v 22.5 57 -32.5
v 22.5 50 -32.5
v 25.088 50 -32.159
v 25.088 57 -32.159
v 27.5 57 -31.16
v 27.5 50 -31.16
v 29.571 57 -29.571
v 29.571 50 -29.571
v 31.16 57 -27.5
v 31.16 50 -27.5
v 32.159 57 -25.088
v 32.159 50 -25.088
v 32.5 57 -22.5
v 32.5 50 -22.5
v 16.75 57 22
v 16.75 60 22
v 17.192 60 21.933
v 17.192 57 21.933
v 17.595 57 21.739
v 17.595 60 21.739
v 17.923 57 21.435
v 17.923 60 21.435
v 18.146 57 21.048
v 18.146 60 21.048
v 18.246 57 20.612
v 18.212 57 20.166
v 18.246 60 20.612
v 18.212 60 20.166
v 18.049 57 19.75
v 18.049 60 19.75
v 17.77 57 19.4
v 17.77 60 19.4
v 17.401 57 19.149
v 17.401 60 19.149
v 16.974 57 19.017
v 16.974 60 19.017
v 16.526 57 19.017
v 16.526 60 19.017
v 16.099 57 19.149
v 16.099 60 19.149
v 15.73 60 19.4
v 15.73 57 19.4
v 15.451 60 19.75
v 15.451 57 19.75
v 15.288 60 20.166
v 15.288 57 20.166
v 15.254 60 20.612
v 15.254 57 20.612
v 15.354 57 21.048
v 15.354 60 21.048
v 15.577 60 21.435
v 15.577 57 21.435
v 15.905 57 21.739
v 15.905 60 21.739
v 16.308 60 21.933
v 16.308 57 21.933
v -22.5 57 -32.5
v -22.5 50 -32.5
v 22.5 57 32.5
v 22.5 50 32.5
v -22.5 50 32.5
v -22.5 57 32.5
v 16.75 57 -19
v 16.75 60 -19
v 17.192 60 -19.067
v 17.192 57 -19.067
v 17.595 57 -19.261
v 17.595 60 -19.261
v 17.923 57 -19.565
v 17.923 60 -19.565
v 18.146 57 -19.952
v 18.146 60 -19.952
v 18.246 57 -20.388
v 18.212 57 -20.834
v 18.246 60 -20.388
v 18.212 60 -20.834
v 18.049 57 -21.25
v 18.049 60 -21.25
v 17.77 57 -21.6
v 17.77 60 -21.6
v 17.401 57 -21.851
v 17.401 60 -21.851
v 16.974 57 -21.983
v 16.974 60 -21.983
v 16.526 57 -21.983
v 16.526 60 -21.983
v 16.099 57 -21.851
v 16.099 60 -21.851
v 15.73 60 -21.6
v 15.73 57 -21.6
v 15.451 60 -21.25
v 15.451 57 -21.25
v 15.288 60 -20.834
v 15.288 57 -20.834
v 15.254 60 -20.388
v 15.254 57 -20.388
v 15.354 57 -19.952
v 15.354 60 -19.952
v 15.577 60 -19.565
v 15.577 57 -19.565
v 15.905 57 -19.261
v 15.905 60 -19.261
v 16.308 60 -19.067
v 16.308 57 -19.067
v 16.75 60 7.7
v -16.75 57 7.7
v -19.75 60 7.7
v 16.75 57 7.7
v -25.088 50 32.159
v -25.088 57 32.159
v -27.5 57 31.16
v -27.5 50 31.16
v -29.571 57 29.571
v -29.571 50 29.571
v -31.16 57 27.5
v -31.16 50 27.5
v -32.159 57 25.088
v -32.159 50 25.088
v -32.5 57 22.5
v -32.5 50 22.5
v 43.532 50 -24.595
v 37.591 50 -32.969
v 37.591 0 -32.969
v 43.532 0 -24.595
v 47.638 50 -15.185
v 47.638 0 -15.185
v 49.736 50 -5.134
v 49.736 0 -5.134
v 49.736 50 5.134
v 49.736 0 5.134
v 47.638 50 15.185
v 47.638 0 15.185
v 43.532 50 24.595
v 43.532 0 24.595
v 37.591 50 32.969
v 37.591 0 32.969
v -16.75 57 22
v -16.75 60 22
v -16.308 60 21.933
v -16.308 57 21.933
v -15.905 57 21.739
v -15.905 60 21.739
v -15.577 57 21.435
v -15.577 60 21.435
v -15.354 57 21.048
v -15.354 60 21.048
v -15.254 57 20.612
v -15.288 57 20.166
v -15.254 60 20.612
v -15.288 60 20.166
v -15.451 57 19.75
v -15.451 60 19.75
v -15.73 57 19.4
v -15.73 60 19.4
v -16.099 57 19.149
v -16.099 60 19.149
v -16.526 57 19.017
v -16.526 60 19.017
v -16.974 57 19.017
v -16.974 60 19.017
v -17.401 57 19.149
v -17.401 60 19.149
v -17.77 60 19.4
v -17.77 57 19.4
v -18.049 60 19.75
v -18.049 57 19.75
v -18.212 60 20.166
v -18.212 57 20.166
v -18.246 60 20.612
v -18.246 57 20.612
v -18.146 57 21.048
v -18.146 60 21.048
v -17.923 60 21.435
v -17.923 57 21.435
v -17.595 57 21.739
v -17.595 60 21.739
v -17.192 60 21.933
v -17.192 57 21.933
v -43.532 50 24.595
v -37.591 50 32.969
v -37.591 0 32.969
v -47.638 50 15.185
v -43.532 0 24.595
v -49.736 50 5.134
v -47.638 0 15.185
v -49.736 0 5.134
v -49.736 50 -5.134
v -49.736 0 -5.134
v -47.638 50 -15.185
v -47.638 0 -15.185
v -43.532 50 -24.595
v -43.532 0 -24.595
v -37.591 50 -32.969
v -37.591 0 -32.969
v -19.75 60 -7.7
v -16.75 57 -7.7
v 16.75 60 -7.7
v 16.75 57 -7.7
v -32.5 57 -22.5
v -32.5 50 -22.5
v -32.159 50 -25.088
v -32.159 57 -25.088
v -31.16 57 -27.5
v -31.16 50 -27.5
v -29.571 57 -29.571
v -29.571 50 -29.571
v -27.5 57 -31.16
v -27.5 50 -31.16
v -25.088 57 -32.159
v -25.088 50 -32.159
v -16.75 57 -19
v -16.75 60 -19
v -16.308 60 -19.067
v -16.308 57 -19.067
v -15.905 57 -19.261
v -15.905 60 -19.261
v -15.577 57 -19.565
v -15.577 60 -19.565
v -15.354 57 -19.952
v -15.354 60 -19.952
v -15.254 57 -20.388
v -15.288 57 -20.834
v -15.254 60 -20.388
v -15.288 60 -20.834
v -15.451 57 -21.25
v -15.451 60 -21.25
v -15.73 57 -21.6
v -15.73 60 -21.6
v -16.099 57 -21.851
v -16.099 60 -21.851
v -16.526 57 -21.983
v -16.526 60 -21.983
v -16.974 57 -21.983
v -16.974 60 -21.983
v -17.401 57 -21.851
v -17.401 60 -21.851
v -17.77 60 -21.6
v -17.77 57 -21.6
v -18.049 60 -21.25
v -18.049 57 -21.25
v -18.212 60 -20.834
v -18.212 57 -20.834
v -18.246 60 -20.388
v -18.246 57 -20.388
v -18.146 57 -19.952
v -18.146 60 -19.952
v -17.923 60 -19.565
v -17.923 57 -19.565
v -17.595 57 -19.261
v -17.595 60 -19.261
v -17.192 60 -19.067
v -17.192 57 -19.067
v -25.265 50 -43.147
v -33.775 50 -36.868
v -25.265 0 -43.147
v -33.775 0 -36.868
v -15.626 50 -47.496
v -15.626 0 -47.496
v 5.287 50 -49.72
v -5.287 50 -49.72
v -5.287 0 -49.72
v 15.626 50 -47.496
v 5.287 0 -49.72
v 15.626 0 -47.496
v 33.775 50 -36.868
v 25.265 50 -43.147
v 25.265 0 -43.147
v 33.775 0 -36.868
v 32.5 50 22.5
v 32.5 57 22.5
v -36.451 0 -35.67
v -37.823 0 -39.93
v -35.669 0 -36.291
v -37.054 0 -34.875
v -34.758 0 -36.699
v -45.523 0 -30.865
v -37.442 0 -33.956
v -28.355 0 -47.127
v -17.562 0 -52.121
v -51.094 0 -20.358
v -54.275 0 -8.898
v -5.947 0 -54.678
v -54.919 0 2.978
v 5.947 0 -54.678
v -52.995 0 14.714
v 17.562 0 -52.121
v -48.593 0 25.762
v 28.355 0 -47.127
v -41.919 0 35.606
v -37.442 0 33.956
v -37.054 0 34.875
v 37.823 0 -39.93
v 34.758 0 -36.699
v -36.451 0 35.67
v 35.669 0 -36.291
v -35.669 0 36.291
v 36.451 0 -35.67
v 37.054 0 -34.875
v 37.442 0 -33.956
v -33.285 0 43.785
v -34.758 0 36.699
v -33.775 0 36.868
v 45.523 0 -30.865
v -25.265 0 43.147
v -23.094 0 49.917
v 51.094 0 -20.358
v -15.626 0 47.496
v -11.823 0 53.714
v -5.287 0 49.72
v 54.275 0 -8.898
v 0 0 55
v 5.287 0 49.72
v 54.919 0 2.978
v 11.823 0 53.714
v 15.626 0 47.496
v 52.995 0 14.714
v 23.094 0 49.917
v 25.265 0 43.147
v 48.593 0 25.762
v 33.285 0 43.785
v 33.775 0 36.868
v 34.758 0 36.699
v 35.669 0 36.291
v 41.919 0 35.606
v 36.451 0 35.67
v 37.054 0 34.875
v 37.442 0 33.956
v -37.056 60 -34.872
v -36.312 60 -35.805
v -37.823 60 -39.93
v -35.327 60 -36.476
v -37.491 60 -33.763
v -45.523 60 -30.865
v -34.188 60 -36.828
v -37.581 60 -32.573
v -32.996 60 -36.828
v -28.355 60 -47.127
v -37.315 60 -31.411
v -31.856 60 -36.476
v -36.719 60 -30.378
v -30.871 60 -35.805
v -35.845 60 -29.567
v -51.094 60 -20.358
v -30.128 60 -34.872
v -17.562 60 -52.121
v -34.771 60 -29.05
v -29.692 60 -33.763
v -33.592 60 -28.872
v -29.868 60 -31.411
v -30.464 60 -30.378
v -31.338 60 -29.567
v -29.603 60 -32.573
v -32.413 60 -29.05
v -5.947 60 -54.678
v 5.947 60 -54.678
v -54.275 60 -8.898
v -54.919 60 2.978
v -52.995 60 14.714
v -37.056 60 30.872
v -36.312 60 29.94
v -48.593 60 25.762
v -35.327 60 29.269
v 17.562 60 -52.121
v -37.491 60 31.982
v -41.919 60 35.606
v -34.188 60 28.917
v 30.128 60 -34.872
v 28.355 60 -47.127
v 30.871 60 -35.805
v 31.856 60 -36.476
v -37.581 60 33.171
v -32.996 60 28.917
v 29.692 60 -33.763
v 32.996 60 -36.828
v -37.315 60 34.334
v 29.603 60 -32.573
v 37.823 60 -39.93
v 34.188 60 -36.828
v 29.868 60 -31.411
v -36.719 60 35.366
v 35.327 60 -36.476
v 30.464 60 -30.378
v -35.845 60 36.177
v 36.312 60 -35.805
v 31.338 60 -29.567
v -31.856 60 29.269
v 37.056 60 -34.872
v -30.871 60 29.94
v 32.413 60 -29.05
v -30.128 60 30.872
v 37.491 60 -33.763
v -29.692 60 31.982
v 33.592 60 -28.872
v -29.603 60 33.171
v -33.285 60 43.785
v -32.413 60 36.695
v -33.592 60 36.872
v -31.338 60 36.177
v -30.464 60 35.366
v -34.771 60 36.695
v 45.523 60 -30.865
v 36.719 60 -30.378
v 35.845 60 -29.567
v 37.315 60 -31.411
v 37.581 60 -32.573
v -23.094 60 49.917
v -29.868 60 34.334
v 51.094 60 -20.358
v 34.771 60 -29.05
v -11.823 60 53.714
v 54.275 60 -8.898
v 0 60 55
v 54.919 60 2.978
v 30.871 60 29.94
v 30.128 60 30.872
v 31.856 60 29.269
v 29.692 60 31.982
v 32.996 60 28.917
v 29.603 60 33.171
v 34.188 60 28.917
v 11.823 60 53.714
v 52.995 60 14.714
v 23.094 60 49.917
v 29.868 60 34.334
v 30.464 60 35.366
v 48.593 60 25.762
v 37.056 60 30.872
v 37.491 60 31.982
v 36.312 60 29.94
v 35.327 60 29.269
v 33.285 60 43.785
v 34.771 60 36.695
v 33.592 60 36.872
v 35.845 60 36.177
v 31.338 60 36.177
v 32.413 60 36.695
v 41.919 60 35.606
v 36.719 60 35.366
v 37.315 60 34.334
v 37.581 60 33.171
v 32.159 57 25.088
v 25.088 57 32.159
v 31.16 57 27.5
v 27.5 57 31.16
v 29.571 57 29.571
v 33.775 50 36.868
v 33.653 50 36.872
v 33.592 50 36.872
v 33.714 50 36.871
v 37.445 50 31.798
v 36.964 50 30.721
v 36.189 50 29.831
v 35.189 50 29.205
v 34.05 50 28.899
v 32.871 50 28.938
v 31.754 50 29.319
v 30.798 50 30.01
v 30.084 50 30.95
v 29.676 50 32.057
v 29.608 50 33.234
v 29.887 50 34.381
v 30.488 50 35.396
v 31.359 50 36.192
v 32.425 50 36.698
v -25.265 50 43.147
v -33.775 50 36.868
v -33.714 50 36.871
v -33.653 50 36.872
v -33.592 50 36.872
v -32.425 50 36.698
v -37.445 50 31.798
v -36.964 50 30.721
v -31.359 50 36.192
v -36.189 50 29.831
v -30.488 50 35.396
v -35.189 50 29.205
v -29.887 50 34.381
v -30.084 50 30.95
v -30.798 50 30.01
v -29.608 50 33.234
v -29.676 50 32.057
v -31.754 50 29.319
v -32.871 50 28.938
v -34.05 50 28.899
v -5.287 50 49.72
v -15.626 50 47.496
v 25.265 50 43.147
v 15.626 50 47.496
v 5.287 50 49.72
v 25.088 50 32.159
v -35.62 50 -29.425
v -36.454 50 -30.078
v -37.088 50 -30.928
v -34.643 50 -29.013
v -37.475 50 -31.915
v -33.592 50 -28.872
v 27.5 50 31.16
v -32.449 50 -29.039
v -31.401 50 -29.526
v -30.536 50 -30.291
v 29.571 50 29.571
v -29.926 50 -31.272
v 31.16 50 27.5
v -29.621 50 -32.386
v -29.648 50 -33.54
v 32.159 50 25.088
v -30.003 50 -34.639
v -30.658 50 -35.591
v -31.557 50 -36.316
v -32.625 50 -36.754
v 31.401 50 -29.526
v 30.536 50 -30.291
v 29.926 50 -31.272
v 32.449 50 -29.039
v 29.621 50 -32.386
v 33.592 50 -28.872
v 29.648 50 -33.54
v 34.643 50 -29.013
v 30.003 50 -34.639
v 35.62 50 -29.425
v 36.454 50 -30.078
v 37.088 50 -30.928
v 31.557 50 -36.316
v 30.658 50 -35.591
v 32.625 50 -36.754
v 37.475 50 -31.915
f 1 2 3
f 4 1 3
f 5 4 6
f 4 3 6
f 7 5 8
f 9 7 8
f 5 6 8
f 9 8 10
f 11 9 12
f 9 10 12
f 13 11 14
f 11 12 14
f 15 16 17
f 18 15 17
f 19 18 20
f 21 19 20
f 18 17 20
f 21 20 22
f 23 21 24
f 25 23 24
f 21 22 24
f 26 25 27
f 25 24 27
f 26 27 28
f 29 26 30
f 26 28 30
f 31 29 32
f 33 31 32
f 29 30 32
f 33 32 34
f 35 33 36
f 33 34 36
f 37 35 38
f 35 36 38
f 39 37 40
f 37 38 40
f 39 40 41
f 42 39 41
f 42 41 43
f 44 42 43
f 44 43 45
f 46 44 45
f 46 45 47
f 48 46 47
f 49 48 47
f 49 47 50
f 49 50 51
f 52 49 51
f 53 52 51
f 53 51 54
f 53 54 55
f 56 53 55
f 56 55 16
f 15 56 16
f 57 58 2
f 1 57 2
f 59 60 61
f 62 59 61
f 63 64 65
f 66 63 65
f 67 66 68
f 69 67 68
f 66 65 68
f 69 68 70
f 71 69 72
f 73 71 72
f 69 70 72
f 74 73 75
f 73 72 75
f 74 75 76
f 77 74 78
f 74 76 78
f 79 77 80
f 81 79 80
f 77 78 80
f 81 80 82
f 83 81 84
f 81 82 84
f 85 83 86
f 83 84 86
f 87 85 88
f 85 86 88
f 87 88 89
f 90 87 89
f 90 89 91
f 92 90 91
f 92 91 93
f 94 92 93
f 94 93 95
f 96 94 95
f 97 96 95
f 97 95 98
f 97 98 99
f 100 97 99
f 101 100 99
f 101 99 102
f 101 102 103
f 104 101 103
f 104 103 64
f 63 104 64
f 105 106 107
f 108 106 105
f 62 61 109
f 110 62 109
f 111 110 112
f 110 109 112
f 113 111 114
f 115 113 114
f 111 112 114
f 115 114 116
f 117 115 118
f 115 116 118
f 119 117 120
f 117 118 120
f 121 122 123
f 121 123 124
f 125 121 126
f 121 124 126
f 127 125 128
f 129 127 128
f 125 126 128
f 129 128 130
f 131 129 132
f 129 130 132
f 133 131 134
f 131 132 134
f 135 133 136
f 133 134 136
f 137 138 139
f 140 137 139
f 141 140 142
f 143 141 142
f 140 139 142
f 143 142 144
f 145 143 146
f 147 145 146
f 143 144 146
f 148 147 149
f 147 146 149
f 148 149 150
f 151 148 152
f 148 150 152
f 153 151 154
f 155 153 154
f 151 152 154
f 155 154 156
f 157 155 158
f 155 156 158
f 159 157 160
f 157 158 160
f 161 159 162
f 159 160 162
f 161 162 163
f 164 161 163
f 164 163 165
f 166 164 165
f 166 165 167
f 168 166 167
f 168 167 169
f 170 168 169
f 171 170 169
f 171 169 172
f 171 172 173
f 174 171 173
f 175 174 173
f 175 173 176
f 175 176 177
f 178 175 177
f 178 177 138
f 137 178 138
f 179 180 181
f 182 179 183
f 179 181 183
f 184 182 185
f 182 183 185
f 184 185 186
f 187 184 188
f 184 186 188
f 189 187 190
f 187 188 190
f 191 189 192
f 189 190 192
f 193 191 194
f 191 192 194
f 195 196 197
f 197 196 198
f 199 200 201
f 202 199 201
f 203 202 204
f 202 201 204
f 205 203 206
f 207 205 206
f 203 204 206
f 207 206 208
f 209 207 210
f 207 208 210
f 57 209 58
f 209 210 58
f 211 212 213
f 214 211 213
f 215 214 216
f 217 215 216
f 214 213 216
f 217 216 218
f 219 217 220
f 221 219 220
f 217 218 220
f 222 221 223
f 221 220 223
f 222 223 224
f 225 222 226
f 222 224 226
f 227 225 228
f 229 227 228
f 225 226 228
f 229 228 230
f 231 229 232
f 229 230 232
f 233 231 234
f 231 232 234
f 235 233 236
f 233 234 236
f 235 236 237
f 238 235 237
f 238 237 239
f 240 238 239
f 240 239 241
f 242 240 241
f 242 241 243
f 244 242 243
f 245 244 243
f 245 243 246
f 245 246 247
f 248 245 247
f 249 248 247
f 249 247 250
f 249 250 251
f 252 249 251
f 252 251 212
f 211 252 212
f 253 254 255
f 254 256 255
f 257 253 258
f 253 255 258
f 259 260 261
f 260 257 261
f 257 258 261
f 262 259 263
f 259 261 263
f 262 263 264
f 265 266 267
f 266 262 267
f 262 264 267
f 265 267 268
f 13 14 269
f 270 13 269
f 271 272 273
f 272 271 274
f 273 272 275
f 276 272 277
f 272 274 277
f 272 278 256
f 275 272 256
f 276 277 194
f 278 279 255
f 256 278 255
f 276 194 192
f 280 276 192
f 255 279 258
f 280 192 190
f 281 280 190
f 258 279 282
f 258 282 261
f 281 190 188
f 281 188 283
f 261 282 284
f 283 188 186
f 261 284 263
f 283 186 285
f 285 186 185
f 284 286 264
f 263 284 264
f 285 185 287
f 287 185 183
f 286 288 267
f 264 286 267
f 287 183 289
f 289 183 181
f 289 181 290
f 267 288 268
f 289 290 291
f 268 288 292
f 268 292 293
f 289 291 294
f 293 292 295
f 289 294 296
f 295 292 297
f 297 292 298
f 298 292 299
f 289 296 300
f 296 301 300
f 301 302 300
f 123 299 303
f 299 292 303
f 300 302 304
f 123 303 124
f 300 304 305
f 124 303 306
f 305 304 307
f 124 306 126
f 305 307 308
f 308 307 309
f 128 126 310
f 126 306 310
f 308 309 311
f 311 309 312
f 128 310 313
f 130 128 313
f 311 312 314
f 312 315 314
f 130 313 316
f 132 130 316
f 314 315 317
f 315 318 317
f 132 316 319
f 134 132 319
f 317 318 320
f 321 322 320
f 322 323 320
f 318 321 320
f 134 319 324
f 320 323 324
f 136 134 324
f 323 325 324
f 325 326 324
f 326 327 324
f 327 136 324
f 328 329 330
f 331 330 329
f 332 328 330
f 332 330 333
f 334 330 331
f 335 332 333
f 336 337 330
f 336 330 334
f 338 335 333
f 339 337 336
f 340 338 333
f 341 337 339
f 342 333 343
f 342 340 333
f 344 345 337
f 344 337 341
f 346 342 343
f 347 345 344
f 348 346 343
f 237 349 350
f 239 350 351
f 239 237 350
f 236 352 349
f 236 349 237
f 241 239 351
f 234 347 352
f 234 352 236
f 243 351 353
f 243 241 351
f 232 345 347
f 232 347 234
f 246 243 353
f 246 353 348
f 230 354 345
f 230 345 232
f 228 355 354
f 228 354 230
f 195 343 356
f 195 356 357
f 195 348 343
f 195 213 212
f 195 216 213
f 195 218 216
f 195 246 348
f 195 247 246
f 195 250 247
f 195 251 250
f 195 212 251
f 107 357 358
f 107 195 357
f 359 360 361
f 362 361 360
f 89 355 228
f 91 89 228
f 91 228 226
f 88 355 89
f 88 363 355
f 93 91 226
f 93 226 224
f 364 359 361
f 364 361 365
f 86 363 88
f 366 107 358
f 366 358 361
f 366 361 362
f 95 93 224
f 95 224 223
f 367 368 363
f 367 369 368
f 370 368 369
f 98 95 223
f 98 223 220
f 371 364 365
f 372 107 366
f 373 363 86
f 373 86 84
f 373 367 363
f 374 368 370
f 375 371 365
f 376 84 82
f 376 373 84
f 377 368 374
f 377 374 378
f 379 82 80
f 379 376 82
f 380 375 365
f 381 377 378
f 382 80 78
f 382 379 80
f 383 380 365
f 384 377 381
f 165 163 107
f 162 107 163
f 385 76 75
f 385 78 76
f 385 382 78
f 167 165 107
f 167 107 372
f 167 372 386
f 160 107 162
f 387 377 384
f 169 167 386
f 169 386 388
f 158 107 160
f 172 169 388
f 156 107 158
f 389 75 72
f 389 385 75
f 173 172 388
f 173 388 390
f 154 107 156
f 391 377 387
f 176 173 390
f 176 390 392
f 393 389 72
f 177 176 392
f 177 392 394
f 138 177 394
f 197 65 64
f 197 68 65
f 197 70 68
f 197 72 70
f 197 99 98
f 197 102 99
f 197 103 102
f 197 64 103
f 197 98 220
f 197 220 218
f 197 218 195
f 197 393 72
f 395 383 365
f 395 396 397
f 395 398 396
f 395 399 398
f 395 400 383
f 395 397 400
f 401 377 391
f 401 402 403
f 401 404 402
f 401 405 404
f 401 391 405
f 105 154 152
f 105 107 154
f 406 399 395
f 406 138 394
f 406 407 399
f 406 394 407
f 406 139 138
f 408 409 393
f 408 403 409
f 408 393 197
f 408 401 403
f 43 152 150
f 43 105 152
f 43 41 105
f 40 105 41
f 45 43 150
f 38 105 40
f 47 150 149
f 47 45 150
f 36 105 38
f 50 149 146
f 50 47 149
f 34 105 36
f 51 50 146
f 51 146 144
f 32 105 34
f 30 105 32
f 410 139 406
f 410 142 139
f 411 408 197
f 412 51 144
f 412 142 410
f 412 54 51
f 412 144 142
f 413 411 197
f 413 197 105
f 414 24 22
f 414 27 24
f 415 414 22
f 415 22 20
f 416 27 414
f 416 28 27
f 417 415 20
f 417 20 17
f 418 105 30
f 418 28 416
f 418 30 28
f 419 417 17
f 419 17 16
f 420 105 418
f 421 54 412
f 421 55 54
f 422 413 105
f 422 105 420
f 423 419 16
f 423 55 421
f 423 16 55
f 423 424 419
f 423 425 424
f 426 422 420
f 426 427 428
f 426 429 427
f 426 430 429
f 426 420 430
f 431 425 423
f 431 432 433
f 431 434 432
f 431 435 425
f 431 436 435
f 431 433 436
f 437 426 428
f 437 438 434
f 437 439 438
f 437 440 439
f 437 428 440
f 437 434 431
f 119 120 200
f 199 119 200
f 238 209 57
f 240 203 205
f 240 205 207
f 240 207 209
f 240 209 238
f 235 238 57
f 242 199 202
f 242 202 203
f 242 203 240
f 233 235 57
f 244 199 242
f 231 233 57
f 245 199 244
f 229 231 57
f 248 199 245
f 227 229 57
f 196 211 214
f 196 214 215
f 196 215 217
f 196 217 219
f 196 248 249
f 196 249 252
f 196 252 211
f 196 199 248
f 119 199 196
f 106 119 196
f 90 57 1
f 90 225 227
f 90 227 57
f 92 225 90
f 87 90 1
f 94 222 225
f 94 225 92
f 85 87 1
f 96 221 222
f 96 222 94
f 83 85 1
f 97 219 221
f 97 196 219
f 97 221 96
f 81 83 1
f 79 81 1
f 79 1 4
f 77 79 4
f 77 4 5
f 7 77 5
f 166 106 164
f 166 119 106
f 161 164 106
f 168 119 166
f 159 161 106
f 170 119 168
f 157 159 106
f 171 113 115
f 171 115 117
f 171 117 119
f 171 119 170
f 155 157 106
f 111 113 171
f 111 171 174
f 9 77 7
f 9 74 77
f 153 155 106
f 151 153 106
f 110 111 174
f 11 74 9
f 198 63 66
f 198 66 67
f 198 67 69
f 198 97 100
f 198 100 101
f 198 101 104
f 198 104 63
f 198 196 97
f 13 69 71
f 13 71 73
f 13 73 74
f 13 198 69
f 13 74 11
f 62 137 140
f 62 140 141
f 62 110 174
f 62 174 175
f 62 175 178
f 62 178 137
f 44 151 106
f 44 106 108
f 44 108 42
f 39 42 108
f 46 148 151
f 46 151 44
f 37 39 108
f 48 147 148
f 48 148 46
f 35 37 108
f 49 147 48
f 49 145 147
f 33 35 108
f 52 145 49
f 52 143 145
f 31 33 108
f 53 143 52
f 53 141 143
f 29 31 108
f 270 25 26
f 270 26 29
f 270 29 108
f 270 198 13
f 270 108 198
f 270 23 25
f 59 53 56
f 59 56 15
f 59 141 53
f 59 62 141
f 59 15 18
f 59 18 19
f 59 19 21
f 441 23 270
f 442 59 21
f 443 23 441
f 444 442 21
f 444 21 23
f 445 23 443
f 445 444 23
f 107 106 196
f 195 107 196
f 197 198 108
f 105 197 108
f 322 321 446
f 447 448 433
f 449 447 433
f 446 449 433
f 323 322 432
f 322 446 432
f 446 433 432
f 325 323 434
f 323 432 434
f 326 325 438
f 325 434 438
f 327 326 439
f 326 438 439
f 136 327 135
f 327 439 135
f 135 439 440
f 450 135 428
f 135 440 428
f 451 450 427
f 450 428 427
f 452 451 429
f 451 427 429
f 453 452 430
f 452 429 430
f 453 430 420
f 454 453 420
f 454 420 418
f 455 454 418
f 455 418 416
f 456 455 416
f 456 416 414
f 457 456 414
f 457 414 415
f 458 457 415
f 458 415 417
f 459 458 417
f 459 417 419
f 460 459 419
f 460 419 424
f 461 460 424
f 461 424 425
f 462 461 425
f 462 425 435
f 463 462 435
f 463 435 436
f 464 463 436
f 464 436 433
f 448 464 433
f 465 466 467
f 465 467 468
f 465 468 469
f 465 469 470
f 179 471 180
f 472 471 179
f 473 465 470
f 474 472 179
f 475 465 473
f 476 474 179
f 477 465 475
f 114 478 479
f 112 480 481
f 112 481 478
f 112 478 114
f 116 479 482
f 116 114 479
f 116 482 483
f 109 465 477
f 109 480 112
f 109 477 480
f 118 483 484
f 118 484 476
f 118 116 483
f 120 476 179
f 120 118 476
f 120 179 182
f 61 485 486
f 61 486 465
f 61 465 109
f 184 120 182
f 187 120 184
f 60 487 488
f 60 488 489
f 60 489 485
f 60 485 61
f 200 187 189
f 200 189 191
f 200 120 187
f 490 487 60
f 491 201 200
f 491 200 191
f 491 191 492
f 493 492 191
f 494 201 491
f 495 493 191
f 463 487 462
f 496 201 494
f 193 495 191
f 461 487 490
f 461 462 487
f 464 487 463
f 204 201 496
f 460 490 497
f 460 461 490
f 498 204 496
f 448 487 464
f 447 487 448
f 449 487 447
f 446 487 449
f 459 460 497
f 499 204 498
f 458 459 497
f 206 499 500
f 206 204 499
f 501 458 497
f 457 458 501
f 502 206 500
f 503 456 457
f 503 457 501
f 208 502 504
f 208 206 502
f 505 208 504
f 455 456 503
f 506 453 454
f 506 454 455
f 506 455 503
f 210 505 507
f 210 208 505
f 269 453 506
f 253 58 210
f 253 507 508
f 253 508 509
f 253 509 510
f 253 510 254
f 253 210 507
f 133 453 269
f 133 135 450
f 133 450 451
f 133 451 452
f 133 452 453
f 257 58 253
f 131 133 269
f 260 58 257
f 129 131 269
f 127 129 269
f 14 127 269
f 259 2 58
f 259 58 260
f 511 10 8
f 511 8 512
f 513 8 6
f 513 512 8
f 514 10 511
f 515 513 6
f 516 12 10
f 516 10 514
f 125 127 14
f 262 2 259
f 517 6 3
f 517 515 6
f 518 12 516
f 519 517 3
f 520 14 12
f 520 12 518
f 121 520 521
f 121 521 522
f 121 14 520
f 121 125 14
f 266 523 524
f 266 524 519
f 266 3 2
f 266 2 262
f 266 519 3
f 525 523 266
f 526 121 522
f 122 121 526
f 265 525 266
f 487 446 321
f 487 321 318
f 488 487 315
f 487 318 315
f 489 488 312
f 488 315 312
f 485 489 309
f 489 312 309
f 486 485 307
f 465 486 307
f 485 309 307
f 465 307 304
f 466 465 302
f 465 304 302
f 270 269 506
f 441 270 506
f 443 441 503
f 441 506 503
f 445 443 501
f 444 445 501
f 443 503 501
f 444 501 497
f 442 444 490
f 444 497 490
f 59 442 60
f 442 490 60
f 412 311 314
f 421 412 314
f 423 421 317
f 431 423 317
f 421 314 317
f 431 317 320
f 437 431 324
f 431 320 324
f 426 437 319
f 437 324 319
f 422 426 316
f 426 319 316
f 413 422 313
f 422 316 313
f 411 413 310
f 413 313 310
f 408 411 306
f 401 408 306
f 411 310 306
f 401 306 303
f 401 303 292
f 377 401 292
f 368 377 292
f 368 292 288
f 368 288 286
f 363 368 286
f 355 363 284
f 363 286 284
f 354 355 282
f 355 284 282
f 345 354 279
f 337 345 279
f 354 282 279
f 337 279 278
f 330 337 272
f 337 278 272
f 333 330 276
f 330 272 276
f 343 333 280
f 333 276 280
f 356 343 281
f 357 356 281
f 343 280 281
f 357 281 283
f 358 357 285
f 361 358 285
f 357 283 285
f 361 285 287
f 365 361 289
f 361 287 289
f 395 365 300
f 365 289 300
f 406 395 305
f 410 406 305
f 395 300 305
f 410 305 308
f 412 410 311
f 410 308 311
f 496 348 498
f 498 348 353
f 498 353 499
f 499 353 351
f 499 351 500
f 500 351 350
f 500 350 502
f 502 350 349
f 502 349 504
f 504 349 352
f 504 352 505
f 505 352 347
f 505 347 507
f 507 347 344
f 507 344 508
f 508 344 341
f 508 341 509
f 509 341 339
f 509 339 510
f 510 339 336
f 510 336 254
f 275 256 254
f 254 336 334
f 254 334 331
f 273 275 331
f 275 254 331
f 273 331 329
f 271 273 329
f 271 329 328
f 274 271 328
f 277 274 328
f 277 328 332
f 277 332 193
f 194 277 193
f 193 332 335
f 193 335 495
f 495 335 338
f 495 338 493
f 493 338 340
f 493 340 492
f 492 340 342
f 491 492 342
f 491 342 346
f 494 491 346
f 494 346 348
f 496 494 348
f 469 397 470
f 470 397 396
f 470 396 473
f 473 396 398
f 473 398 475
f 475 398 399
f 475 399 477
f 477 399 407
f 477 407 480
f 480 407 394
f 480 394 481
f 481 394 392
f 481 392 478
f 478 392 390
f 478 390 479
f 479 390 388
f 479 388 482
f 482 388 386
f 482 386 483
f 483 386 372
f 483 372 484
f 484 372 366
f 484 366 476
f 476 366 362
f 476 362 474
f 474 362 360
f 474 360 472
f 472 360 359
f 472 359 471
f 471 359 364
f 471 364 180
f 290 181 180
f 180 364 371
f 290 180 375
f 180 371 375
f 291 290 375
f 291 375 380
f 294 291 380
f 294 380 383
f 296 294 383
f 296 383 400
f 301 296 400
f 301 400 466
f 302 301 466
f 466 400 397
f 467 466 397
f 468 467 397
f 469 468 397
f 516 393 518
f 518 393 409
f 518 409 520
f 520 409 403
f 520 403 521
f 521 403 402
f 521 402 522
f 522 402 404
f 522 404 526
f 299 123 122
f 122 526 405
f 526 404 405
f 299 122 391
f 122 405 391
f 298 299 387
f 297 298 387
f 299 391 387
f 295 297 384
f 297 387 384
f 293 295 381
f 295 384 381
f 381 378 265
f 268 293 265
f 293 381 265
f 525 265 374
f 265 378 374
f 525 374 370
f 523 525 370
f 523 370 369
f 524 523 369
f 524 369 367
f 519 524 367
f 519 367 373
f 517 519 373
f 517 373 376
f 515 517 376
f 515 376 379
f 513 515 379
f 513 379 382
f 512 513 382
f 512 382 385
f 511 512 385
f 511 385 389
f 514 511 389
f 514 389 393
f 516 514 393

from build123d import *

# Parameters (mm, degrees)
SKETCH_1_R          = 55
EXTRUDE_1_DEPTH     = 60
SKETCH_2_R          = 50
CUT_EXTRUDE_1_DEPTH = 50
SKETCH_3_W          = 33.5
SKETCH_3_H          = 15.4
CUT_EXTRUDE_2_DEPTH = 93.466210045
SKETCH_4_R          = 1.5
SKETCH_4_R_2        = 4
CUT_EXTRUDE_3_DEPTH = 99.234413522
CUT_EXTRUDE_4_DEPTH = 7
CHAMFER_1_SIZE      = 3


with BuildPart() as part:
    # Эскиз1 → Бобышка-Вытянуть1 (new body)
    with BuildSketch(Plane(origin=(0, 0, 0), x_dir=(1, 0, 0), z_dir=(0, 1, 0))):
        with Locations(Location((0, 0, 0), (0, 0, 270))):
            Circle(SKETCH_1_R)
    extrude(amount=EXTRUDE_1_DEPTH)

    # Эскиз2 → Вырез-Вытянуть1 (cut)
    with BuildSketch(Plane.XZ):
        with Locations(Location((0, 0, 0), (0, 0, 270))):
            Circle(SKETCH_2_R)
    extrude(amount=-CUT_EXTRUDE_1_DEPTH, mode=Mode.SUBTRACT)

    # Эскиз3 → Вырез-Вытянуть2 (cut, through all)
    with BuildSketch(Plane.XZ.offset(-50)):
        Rectangle(SKETCH_3_W, SKETCH_3_H)
    extrude(amount=-CUT_EXTRUDE_2_DEPTH, mode=Mode.SUBTRACT)

    # Эскиз4 → Вырез-Вытянуть3 (cut, through all)
    with BuildSketch(Plane(origin=(0, 60, 0), x_dir=(1, 0, 0), z_dir=(0, 1, 0))):
        with Locations(Location((-16.75, 20.5, 0), (0, 0, 270))):
            Circle(SKETCH_4_R)
        with Locations(Location((16.75, 20.5, 0), (0, 0, 270))):
            Circle(SKETCH_4_R)
        with Locations(Location((-16.75, -20.5, 0), (0, 0, 270))):
            Circle(SKETCH_4_R)
        with Locations(Location((16.75, -20.5, 0), (0, 0, 270))):
            Circle(SKETCH_4_R)
        with Locations(Location((33.591727056, -32.872418125, 0), (0, 0, 270))):
            Circle(SKETCH_4_R_2)
        with Locations(Location((-33.591727056, -32.872418125, 0), (0, 0, 270))):
            Circle(SKETCH_4_R_2)
        with Locations(Location((-33.591727056, 32.872418125, 0), (0, 0, 270))):
            Circle(SKETCH_4_R_2)
        with Locations(Location((33.591727056, 32.872418125, 0), (0, 0, 270))):
            Circle(SKETCH_4_R_2)
    extrude(amount=-CUT_EXTRUDE_3_DEPTH, mode=Mode.SUBTRACT)

    # Эскиз6 → Вырез-Вытянуть4 (cut)
    with BuildSketch(Plane.XZ.offset(-50)):
        with BuildLine():
            Line((-22.5, -32.5), (22.5, -32.5))
            ThreePointArc((22.5, -32.5), (29.571067812, -29.571067812), (32.5, -22.5))
            Line((32.5, -22.5), (32.5, 22.5))
            ThreePointArc((32.5, 22.5), (29.571067812, 29.571067812), (22.5, 32.5))
            Line((22.5, 32.5), (-22.5, 32.5))
            ThreePointArc((-22.5, 32.5), (-29.571067812, 29.571067812), (-32.5, 22.5))
            Line((-32.5, 22.5), (-32.5, -22.5))
            ThreePointArc((-32.5, -22.5), (-29.571067812, -29.571067812), (-22.5, -32.5))
        make_face()
    extrude(amount=-CUT_EXTRUDE_4_DEPTH, mode=Mode.SUBTRACT)

    # Фаска1
    chamfer_1_edges = [part.edges().sort_by_distance(p)[0] for p in [
        (-16.75, 60, 0),
    ]]
    chamfer(chamfer_1_edges, length=CHAMFER_1_SIZE - 0.0001)  # a hair under: the kernel refuses the full size


solid = part.part
